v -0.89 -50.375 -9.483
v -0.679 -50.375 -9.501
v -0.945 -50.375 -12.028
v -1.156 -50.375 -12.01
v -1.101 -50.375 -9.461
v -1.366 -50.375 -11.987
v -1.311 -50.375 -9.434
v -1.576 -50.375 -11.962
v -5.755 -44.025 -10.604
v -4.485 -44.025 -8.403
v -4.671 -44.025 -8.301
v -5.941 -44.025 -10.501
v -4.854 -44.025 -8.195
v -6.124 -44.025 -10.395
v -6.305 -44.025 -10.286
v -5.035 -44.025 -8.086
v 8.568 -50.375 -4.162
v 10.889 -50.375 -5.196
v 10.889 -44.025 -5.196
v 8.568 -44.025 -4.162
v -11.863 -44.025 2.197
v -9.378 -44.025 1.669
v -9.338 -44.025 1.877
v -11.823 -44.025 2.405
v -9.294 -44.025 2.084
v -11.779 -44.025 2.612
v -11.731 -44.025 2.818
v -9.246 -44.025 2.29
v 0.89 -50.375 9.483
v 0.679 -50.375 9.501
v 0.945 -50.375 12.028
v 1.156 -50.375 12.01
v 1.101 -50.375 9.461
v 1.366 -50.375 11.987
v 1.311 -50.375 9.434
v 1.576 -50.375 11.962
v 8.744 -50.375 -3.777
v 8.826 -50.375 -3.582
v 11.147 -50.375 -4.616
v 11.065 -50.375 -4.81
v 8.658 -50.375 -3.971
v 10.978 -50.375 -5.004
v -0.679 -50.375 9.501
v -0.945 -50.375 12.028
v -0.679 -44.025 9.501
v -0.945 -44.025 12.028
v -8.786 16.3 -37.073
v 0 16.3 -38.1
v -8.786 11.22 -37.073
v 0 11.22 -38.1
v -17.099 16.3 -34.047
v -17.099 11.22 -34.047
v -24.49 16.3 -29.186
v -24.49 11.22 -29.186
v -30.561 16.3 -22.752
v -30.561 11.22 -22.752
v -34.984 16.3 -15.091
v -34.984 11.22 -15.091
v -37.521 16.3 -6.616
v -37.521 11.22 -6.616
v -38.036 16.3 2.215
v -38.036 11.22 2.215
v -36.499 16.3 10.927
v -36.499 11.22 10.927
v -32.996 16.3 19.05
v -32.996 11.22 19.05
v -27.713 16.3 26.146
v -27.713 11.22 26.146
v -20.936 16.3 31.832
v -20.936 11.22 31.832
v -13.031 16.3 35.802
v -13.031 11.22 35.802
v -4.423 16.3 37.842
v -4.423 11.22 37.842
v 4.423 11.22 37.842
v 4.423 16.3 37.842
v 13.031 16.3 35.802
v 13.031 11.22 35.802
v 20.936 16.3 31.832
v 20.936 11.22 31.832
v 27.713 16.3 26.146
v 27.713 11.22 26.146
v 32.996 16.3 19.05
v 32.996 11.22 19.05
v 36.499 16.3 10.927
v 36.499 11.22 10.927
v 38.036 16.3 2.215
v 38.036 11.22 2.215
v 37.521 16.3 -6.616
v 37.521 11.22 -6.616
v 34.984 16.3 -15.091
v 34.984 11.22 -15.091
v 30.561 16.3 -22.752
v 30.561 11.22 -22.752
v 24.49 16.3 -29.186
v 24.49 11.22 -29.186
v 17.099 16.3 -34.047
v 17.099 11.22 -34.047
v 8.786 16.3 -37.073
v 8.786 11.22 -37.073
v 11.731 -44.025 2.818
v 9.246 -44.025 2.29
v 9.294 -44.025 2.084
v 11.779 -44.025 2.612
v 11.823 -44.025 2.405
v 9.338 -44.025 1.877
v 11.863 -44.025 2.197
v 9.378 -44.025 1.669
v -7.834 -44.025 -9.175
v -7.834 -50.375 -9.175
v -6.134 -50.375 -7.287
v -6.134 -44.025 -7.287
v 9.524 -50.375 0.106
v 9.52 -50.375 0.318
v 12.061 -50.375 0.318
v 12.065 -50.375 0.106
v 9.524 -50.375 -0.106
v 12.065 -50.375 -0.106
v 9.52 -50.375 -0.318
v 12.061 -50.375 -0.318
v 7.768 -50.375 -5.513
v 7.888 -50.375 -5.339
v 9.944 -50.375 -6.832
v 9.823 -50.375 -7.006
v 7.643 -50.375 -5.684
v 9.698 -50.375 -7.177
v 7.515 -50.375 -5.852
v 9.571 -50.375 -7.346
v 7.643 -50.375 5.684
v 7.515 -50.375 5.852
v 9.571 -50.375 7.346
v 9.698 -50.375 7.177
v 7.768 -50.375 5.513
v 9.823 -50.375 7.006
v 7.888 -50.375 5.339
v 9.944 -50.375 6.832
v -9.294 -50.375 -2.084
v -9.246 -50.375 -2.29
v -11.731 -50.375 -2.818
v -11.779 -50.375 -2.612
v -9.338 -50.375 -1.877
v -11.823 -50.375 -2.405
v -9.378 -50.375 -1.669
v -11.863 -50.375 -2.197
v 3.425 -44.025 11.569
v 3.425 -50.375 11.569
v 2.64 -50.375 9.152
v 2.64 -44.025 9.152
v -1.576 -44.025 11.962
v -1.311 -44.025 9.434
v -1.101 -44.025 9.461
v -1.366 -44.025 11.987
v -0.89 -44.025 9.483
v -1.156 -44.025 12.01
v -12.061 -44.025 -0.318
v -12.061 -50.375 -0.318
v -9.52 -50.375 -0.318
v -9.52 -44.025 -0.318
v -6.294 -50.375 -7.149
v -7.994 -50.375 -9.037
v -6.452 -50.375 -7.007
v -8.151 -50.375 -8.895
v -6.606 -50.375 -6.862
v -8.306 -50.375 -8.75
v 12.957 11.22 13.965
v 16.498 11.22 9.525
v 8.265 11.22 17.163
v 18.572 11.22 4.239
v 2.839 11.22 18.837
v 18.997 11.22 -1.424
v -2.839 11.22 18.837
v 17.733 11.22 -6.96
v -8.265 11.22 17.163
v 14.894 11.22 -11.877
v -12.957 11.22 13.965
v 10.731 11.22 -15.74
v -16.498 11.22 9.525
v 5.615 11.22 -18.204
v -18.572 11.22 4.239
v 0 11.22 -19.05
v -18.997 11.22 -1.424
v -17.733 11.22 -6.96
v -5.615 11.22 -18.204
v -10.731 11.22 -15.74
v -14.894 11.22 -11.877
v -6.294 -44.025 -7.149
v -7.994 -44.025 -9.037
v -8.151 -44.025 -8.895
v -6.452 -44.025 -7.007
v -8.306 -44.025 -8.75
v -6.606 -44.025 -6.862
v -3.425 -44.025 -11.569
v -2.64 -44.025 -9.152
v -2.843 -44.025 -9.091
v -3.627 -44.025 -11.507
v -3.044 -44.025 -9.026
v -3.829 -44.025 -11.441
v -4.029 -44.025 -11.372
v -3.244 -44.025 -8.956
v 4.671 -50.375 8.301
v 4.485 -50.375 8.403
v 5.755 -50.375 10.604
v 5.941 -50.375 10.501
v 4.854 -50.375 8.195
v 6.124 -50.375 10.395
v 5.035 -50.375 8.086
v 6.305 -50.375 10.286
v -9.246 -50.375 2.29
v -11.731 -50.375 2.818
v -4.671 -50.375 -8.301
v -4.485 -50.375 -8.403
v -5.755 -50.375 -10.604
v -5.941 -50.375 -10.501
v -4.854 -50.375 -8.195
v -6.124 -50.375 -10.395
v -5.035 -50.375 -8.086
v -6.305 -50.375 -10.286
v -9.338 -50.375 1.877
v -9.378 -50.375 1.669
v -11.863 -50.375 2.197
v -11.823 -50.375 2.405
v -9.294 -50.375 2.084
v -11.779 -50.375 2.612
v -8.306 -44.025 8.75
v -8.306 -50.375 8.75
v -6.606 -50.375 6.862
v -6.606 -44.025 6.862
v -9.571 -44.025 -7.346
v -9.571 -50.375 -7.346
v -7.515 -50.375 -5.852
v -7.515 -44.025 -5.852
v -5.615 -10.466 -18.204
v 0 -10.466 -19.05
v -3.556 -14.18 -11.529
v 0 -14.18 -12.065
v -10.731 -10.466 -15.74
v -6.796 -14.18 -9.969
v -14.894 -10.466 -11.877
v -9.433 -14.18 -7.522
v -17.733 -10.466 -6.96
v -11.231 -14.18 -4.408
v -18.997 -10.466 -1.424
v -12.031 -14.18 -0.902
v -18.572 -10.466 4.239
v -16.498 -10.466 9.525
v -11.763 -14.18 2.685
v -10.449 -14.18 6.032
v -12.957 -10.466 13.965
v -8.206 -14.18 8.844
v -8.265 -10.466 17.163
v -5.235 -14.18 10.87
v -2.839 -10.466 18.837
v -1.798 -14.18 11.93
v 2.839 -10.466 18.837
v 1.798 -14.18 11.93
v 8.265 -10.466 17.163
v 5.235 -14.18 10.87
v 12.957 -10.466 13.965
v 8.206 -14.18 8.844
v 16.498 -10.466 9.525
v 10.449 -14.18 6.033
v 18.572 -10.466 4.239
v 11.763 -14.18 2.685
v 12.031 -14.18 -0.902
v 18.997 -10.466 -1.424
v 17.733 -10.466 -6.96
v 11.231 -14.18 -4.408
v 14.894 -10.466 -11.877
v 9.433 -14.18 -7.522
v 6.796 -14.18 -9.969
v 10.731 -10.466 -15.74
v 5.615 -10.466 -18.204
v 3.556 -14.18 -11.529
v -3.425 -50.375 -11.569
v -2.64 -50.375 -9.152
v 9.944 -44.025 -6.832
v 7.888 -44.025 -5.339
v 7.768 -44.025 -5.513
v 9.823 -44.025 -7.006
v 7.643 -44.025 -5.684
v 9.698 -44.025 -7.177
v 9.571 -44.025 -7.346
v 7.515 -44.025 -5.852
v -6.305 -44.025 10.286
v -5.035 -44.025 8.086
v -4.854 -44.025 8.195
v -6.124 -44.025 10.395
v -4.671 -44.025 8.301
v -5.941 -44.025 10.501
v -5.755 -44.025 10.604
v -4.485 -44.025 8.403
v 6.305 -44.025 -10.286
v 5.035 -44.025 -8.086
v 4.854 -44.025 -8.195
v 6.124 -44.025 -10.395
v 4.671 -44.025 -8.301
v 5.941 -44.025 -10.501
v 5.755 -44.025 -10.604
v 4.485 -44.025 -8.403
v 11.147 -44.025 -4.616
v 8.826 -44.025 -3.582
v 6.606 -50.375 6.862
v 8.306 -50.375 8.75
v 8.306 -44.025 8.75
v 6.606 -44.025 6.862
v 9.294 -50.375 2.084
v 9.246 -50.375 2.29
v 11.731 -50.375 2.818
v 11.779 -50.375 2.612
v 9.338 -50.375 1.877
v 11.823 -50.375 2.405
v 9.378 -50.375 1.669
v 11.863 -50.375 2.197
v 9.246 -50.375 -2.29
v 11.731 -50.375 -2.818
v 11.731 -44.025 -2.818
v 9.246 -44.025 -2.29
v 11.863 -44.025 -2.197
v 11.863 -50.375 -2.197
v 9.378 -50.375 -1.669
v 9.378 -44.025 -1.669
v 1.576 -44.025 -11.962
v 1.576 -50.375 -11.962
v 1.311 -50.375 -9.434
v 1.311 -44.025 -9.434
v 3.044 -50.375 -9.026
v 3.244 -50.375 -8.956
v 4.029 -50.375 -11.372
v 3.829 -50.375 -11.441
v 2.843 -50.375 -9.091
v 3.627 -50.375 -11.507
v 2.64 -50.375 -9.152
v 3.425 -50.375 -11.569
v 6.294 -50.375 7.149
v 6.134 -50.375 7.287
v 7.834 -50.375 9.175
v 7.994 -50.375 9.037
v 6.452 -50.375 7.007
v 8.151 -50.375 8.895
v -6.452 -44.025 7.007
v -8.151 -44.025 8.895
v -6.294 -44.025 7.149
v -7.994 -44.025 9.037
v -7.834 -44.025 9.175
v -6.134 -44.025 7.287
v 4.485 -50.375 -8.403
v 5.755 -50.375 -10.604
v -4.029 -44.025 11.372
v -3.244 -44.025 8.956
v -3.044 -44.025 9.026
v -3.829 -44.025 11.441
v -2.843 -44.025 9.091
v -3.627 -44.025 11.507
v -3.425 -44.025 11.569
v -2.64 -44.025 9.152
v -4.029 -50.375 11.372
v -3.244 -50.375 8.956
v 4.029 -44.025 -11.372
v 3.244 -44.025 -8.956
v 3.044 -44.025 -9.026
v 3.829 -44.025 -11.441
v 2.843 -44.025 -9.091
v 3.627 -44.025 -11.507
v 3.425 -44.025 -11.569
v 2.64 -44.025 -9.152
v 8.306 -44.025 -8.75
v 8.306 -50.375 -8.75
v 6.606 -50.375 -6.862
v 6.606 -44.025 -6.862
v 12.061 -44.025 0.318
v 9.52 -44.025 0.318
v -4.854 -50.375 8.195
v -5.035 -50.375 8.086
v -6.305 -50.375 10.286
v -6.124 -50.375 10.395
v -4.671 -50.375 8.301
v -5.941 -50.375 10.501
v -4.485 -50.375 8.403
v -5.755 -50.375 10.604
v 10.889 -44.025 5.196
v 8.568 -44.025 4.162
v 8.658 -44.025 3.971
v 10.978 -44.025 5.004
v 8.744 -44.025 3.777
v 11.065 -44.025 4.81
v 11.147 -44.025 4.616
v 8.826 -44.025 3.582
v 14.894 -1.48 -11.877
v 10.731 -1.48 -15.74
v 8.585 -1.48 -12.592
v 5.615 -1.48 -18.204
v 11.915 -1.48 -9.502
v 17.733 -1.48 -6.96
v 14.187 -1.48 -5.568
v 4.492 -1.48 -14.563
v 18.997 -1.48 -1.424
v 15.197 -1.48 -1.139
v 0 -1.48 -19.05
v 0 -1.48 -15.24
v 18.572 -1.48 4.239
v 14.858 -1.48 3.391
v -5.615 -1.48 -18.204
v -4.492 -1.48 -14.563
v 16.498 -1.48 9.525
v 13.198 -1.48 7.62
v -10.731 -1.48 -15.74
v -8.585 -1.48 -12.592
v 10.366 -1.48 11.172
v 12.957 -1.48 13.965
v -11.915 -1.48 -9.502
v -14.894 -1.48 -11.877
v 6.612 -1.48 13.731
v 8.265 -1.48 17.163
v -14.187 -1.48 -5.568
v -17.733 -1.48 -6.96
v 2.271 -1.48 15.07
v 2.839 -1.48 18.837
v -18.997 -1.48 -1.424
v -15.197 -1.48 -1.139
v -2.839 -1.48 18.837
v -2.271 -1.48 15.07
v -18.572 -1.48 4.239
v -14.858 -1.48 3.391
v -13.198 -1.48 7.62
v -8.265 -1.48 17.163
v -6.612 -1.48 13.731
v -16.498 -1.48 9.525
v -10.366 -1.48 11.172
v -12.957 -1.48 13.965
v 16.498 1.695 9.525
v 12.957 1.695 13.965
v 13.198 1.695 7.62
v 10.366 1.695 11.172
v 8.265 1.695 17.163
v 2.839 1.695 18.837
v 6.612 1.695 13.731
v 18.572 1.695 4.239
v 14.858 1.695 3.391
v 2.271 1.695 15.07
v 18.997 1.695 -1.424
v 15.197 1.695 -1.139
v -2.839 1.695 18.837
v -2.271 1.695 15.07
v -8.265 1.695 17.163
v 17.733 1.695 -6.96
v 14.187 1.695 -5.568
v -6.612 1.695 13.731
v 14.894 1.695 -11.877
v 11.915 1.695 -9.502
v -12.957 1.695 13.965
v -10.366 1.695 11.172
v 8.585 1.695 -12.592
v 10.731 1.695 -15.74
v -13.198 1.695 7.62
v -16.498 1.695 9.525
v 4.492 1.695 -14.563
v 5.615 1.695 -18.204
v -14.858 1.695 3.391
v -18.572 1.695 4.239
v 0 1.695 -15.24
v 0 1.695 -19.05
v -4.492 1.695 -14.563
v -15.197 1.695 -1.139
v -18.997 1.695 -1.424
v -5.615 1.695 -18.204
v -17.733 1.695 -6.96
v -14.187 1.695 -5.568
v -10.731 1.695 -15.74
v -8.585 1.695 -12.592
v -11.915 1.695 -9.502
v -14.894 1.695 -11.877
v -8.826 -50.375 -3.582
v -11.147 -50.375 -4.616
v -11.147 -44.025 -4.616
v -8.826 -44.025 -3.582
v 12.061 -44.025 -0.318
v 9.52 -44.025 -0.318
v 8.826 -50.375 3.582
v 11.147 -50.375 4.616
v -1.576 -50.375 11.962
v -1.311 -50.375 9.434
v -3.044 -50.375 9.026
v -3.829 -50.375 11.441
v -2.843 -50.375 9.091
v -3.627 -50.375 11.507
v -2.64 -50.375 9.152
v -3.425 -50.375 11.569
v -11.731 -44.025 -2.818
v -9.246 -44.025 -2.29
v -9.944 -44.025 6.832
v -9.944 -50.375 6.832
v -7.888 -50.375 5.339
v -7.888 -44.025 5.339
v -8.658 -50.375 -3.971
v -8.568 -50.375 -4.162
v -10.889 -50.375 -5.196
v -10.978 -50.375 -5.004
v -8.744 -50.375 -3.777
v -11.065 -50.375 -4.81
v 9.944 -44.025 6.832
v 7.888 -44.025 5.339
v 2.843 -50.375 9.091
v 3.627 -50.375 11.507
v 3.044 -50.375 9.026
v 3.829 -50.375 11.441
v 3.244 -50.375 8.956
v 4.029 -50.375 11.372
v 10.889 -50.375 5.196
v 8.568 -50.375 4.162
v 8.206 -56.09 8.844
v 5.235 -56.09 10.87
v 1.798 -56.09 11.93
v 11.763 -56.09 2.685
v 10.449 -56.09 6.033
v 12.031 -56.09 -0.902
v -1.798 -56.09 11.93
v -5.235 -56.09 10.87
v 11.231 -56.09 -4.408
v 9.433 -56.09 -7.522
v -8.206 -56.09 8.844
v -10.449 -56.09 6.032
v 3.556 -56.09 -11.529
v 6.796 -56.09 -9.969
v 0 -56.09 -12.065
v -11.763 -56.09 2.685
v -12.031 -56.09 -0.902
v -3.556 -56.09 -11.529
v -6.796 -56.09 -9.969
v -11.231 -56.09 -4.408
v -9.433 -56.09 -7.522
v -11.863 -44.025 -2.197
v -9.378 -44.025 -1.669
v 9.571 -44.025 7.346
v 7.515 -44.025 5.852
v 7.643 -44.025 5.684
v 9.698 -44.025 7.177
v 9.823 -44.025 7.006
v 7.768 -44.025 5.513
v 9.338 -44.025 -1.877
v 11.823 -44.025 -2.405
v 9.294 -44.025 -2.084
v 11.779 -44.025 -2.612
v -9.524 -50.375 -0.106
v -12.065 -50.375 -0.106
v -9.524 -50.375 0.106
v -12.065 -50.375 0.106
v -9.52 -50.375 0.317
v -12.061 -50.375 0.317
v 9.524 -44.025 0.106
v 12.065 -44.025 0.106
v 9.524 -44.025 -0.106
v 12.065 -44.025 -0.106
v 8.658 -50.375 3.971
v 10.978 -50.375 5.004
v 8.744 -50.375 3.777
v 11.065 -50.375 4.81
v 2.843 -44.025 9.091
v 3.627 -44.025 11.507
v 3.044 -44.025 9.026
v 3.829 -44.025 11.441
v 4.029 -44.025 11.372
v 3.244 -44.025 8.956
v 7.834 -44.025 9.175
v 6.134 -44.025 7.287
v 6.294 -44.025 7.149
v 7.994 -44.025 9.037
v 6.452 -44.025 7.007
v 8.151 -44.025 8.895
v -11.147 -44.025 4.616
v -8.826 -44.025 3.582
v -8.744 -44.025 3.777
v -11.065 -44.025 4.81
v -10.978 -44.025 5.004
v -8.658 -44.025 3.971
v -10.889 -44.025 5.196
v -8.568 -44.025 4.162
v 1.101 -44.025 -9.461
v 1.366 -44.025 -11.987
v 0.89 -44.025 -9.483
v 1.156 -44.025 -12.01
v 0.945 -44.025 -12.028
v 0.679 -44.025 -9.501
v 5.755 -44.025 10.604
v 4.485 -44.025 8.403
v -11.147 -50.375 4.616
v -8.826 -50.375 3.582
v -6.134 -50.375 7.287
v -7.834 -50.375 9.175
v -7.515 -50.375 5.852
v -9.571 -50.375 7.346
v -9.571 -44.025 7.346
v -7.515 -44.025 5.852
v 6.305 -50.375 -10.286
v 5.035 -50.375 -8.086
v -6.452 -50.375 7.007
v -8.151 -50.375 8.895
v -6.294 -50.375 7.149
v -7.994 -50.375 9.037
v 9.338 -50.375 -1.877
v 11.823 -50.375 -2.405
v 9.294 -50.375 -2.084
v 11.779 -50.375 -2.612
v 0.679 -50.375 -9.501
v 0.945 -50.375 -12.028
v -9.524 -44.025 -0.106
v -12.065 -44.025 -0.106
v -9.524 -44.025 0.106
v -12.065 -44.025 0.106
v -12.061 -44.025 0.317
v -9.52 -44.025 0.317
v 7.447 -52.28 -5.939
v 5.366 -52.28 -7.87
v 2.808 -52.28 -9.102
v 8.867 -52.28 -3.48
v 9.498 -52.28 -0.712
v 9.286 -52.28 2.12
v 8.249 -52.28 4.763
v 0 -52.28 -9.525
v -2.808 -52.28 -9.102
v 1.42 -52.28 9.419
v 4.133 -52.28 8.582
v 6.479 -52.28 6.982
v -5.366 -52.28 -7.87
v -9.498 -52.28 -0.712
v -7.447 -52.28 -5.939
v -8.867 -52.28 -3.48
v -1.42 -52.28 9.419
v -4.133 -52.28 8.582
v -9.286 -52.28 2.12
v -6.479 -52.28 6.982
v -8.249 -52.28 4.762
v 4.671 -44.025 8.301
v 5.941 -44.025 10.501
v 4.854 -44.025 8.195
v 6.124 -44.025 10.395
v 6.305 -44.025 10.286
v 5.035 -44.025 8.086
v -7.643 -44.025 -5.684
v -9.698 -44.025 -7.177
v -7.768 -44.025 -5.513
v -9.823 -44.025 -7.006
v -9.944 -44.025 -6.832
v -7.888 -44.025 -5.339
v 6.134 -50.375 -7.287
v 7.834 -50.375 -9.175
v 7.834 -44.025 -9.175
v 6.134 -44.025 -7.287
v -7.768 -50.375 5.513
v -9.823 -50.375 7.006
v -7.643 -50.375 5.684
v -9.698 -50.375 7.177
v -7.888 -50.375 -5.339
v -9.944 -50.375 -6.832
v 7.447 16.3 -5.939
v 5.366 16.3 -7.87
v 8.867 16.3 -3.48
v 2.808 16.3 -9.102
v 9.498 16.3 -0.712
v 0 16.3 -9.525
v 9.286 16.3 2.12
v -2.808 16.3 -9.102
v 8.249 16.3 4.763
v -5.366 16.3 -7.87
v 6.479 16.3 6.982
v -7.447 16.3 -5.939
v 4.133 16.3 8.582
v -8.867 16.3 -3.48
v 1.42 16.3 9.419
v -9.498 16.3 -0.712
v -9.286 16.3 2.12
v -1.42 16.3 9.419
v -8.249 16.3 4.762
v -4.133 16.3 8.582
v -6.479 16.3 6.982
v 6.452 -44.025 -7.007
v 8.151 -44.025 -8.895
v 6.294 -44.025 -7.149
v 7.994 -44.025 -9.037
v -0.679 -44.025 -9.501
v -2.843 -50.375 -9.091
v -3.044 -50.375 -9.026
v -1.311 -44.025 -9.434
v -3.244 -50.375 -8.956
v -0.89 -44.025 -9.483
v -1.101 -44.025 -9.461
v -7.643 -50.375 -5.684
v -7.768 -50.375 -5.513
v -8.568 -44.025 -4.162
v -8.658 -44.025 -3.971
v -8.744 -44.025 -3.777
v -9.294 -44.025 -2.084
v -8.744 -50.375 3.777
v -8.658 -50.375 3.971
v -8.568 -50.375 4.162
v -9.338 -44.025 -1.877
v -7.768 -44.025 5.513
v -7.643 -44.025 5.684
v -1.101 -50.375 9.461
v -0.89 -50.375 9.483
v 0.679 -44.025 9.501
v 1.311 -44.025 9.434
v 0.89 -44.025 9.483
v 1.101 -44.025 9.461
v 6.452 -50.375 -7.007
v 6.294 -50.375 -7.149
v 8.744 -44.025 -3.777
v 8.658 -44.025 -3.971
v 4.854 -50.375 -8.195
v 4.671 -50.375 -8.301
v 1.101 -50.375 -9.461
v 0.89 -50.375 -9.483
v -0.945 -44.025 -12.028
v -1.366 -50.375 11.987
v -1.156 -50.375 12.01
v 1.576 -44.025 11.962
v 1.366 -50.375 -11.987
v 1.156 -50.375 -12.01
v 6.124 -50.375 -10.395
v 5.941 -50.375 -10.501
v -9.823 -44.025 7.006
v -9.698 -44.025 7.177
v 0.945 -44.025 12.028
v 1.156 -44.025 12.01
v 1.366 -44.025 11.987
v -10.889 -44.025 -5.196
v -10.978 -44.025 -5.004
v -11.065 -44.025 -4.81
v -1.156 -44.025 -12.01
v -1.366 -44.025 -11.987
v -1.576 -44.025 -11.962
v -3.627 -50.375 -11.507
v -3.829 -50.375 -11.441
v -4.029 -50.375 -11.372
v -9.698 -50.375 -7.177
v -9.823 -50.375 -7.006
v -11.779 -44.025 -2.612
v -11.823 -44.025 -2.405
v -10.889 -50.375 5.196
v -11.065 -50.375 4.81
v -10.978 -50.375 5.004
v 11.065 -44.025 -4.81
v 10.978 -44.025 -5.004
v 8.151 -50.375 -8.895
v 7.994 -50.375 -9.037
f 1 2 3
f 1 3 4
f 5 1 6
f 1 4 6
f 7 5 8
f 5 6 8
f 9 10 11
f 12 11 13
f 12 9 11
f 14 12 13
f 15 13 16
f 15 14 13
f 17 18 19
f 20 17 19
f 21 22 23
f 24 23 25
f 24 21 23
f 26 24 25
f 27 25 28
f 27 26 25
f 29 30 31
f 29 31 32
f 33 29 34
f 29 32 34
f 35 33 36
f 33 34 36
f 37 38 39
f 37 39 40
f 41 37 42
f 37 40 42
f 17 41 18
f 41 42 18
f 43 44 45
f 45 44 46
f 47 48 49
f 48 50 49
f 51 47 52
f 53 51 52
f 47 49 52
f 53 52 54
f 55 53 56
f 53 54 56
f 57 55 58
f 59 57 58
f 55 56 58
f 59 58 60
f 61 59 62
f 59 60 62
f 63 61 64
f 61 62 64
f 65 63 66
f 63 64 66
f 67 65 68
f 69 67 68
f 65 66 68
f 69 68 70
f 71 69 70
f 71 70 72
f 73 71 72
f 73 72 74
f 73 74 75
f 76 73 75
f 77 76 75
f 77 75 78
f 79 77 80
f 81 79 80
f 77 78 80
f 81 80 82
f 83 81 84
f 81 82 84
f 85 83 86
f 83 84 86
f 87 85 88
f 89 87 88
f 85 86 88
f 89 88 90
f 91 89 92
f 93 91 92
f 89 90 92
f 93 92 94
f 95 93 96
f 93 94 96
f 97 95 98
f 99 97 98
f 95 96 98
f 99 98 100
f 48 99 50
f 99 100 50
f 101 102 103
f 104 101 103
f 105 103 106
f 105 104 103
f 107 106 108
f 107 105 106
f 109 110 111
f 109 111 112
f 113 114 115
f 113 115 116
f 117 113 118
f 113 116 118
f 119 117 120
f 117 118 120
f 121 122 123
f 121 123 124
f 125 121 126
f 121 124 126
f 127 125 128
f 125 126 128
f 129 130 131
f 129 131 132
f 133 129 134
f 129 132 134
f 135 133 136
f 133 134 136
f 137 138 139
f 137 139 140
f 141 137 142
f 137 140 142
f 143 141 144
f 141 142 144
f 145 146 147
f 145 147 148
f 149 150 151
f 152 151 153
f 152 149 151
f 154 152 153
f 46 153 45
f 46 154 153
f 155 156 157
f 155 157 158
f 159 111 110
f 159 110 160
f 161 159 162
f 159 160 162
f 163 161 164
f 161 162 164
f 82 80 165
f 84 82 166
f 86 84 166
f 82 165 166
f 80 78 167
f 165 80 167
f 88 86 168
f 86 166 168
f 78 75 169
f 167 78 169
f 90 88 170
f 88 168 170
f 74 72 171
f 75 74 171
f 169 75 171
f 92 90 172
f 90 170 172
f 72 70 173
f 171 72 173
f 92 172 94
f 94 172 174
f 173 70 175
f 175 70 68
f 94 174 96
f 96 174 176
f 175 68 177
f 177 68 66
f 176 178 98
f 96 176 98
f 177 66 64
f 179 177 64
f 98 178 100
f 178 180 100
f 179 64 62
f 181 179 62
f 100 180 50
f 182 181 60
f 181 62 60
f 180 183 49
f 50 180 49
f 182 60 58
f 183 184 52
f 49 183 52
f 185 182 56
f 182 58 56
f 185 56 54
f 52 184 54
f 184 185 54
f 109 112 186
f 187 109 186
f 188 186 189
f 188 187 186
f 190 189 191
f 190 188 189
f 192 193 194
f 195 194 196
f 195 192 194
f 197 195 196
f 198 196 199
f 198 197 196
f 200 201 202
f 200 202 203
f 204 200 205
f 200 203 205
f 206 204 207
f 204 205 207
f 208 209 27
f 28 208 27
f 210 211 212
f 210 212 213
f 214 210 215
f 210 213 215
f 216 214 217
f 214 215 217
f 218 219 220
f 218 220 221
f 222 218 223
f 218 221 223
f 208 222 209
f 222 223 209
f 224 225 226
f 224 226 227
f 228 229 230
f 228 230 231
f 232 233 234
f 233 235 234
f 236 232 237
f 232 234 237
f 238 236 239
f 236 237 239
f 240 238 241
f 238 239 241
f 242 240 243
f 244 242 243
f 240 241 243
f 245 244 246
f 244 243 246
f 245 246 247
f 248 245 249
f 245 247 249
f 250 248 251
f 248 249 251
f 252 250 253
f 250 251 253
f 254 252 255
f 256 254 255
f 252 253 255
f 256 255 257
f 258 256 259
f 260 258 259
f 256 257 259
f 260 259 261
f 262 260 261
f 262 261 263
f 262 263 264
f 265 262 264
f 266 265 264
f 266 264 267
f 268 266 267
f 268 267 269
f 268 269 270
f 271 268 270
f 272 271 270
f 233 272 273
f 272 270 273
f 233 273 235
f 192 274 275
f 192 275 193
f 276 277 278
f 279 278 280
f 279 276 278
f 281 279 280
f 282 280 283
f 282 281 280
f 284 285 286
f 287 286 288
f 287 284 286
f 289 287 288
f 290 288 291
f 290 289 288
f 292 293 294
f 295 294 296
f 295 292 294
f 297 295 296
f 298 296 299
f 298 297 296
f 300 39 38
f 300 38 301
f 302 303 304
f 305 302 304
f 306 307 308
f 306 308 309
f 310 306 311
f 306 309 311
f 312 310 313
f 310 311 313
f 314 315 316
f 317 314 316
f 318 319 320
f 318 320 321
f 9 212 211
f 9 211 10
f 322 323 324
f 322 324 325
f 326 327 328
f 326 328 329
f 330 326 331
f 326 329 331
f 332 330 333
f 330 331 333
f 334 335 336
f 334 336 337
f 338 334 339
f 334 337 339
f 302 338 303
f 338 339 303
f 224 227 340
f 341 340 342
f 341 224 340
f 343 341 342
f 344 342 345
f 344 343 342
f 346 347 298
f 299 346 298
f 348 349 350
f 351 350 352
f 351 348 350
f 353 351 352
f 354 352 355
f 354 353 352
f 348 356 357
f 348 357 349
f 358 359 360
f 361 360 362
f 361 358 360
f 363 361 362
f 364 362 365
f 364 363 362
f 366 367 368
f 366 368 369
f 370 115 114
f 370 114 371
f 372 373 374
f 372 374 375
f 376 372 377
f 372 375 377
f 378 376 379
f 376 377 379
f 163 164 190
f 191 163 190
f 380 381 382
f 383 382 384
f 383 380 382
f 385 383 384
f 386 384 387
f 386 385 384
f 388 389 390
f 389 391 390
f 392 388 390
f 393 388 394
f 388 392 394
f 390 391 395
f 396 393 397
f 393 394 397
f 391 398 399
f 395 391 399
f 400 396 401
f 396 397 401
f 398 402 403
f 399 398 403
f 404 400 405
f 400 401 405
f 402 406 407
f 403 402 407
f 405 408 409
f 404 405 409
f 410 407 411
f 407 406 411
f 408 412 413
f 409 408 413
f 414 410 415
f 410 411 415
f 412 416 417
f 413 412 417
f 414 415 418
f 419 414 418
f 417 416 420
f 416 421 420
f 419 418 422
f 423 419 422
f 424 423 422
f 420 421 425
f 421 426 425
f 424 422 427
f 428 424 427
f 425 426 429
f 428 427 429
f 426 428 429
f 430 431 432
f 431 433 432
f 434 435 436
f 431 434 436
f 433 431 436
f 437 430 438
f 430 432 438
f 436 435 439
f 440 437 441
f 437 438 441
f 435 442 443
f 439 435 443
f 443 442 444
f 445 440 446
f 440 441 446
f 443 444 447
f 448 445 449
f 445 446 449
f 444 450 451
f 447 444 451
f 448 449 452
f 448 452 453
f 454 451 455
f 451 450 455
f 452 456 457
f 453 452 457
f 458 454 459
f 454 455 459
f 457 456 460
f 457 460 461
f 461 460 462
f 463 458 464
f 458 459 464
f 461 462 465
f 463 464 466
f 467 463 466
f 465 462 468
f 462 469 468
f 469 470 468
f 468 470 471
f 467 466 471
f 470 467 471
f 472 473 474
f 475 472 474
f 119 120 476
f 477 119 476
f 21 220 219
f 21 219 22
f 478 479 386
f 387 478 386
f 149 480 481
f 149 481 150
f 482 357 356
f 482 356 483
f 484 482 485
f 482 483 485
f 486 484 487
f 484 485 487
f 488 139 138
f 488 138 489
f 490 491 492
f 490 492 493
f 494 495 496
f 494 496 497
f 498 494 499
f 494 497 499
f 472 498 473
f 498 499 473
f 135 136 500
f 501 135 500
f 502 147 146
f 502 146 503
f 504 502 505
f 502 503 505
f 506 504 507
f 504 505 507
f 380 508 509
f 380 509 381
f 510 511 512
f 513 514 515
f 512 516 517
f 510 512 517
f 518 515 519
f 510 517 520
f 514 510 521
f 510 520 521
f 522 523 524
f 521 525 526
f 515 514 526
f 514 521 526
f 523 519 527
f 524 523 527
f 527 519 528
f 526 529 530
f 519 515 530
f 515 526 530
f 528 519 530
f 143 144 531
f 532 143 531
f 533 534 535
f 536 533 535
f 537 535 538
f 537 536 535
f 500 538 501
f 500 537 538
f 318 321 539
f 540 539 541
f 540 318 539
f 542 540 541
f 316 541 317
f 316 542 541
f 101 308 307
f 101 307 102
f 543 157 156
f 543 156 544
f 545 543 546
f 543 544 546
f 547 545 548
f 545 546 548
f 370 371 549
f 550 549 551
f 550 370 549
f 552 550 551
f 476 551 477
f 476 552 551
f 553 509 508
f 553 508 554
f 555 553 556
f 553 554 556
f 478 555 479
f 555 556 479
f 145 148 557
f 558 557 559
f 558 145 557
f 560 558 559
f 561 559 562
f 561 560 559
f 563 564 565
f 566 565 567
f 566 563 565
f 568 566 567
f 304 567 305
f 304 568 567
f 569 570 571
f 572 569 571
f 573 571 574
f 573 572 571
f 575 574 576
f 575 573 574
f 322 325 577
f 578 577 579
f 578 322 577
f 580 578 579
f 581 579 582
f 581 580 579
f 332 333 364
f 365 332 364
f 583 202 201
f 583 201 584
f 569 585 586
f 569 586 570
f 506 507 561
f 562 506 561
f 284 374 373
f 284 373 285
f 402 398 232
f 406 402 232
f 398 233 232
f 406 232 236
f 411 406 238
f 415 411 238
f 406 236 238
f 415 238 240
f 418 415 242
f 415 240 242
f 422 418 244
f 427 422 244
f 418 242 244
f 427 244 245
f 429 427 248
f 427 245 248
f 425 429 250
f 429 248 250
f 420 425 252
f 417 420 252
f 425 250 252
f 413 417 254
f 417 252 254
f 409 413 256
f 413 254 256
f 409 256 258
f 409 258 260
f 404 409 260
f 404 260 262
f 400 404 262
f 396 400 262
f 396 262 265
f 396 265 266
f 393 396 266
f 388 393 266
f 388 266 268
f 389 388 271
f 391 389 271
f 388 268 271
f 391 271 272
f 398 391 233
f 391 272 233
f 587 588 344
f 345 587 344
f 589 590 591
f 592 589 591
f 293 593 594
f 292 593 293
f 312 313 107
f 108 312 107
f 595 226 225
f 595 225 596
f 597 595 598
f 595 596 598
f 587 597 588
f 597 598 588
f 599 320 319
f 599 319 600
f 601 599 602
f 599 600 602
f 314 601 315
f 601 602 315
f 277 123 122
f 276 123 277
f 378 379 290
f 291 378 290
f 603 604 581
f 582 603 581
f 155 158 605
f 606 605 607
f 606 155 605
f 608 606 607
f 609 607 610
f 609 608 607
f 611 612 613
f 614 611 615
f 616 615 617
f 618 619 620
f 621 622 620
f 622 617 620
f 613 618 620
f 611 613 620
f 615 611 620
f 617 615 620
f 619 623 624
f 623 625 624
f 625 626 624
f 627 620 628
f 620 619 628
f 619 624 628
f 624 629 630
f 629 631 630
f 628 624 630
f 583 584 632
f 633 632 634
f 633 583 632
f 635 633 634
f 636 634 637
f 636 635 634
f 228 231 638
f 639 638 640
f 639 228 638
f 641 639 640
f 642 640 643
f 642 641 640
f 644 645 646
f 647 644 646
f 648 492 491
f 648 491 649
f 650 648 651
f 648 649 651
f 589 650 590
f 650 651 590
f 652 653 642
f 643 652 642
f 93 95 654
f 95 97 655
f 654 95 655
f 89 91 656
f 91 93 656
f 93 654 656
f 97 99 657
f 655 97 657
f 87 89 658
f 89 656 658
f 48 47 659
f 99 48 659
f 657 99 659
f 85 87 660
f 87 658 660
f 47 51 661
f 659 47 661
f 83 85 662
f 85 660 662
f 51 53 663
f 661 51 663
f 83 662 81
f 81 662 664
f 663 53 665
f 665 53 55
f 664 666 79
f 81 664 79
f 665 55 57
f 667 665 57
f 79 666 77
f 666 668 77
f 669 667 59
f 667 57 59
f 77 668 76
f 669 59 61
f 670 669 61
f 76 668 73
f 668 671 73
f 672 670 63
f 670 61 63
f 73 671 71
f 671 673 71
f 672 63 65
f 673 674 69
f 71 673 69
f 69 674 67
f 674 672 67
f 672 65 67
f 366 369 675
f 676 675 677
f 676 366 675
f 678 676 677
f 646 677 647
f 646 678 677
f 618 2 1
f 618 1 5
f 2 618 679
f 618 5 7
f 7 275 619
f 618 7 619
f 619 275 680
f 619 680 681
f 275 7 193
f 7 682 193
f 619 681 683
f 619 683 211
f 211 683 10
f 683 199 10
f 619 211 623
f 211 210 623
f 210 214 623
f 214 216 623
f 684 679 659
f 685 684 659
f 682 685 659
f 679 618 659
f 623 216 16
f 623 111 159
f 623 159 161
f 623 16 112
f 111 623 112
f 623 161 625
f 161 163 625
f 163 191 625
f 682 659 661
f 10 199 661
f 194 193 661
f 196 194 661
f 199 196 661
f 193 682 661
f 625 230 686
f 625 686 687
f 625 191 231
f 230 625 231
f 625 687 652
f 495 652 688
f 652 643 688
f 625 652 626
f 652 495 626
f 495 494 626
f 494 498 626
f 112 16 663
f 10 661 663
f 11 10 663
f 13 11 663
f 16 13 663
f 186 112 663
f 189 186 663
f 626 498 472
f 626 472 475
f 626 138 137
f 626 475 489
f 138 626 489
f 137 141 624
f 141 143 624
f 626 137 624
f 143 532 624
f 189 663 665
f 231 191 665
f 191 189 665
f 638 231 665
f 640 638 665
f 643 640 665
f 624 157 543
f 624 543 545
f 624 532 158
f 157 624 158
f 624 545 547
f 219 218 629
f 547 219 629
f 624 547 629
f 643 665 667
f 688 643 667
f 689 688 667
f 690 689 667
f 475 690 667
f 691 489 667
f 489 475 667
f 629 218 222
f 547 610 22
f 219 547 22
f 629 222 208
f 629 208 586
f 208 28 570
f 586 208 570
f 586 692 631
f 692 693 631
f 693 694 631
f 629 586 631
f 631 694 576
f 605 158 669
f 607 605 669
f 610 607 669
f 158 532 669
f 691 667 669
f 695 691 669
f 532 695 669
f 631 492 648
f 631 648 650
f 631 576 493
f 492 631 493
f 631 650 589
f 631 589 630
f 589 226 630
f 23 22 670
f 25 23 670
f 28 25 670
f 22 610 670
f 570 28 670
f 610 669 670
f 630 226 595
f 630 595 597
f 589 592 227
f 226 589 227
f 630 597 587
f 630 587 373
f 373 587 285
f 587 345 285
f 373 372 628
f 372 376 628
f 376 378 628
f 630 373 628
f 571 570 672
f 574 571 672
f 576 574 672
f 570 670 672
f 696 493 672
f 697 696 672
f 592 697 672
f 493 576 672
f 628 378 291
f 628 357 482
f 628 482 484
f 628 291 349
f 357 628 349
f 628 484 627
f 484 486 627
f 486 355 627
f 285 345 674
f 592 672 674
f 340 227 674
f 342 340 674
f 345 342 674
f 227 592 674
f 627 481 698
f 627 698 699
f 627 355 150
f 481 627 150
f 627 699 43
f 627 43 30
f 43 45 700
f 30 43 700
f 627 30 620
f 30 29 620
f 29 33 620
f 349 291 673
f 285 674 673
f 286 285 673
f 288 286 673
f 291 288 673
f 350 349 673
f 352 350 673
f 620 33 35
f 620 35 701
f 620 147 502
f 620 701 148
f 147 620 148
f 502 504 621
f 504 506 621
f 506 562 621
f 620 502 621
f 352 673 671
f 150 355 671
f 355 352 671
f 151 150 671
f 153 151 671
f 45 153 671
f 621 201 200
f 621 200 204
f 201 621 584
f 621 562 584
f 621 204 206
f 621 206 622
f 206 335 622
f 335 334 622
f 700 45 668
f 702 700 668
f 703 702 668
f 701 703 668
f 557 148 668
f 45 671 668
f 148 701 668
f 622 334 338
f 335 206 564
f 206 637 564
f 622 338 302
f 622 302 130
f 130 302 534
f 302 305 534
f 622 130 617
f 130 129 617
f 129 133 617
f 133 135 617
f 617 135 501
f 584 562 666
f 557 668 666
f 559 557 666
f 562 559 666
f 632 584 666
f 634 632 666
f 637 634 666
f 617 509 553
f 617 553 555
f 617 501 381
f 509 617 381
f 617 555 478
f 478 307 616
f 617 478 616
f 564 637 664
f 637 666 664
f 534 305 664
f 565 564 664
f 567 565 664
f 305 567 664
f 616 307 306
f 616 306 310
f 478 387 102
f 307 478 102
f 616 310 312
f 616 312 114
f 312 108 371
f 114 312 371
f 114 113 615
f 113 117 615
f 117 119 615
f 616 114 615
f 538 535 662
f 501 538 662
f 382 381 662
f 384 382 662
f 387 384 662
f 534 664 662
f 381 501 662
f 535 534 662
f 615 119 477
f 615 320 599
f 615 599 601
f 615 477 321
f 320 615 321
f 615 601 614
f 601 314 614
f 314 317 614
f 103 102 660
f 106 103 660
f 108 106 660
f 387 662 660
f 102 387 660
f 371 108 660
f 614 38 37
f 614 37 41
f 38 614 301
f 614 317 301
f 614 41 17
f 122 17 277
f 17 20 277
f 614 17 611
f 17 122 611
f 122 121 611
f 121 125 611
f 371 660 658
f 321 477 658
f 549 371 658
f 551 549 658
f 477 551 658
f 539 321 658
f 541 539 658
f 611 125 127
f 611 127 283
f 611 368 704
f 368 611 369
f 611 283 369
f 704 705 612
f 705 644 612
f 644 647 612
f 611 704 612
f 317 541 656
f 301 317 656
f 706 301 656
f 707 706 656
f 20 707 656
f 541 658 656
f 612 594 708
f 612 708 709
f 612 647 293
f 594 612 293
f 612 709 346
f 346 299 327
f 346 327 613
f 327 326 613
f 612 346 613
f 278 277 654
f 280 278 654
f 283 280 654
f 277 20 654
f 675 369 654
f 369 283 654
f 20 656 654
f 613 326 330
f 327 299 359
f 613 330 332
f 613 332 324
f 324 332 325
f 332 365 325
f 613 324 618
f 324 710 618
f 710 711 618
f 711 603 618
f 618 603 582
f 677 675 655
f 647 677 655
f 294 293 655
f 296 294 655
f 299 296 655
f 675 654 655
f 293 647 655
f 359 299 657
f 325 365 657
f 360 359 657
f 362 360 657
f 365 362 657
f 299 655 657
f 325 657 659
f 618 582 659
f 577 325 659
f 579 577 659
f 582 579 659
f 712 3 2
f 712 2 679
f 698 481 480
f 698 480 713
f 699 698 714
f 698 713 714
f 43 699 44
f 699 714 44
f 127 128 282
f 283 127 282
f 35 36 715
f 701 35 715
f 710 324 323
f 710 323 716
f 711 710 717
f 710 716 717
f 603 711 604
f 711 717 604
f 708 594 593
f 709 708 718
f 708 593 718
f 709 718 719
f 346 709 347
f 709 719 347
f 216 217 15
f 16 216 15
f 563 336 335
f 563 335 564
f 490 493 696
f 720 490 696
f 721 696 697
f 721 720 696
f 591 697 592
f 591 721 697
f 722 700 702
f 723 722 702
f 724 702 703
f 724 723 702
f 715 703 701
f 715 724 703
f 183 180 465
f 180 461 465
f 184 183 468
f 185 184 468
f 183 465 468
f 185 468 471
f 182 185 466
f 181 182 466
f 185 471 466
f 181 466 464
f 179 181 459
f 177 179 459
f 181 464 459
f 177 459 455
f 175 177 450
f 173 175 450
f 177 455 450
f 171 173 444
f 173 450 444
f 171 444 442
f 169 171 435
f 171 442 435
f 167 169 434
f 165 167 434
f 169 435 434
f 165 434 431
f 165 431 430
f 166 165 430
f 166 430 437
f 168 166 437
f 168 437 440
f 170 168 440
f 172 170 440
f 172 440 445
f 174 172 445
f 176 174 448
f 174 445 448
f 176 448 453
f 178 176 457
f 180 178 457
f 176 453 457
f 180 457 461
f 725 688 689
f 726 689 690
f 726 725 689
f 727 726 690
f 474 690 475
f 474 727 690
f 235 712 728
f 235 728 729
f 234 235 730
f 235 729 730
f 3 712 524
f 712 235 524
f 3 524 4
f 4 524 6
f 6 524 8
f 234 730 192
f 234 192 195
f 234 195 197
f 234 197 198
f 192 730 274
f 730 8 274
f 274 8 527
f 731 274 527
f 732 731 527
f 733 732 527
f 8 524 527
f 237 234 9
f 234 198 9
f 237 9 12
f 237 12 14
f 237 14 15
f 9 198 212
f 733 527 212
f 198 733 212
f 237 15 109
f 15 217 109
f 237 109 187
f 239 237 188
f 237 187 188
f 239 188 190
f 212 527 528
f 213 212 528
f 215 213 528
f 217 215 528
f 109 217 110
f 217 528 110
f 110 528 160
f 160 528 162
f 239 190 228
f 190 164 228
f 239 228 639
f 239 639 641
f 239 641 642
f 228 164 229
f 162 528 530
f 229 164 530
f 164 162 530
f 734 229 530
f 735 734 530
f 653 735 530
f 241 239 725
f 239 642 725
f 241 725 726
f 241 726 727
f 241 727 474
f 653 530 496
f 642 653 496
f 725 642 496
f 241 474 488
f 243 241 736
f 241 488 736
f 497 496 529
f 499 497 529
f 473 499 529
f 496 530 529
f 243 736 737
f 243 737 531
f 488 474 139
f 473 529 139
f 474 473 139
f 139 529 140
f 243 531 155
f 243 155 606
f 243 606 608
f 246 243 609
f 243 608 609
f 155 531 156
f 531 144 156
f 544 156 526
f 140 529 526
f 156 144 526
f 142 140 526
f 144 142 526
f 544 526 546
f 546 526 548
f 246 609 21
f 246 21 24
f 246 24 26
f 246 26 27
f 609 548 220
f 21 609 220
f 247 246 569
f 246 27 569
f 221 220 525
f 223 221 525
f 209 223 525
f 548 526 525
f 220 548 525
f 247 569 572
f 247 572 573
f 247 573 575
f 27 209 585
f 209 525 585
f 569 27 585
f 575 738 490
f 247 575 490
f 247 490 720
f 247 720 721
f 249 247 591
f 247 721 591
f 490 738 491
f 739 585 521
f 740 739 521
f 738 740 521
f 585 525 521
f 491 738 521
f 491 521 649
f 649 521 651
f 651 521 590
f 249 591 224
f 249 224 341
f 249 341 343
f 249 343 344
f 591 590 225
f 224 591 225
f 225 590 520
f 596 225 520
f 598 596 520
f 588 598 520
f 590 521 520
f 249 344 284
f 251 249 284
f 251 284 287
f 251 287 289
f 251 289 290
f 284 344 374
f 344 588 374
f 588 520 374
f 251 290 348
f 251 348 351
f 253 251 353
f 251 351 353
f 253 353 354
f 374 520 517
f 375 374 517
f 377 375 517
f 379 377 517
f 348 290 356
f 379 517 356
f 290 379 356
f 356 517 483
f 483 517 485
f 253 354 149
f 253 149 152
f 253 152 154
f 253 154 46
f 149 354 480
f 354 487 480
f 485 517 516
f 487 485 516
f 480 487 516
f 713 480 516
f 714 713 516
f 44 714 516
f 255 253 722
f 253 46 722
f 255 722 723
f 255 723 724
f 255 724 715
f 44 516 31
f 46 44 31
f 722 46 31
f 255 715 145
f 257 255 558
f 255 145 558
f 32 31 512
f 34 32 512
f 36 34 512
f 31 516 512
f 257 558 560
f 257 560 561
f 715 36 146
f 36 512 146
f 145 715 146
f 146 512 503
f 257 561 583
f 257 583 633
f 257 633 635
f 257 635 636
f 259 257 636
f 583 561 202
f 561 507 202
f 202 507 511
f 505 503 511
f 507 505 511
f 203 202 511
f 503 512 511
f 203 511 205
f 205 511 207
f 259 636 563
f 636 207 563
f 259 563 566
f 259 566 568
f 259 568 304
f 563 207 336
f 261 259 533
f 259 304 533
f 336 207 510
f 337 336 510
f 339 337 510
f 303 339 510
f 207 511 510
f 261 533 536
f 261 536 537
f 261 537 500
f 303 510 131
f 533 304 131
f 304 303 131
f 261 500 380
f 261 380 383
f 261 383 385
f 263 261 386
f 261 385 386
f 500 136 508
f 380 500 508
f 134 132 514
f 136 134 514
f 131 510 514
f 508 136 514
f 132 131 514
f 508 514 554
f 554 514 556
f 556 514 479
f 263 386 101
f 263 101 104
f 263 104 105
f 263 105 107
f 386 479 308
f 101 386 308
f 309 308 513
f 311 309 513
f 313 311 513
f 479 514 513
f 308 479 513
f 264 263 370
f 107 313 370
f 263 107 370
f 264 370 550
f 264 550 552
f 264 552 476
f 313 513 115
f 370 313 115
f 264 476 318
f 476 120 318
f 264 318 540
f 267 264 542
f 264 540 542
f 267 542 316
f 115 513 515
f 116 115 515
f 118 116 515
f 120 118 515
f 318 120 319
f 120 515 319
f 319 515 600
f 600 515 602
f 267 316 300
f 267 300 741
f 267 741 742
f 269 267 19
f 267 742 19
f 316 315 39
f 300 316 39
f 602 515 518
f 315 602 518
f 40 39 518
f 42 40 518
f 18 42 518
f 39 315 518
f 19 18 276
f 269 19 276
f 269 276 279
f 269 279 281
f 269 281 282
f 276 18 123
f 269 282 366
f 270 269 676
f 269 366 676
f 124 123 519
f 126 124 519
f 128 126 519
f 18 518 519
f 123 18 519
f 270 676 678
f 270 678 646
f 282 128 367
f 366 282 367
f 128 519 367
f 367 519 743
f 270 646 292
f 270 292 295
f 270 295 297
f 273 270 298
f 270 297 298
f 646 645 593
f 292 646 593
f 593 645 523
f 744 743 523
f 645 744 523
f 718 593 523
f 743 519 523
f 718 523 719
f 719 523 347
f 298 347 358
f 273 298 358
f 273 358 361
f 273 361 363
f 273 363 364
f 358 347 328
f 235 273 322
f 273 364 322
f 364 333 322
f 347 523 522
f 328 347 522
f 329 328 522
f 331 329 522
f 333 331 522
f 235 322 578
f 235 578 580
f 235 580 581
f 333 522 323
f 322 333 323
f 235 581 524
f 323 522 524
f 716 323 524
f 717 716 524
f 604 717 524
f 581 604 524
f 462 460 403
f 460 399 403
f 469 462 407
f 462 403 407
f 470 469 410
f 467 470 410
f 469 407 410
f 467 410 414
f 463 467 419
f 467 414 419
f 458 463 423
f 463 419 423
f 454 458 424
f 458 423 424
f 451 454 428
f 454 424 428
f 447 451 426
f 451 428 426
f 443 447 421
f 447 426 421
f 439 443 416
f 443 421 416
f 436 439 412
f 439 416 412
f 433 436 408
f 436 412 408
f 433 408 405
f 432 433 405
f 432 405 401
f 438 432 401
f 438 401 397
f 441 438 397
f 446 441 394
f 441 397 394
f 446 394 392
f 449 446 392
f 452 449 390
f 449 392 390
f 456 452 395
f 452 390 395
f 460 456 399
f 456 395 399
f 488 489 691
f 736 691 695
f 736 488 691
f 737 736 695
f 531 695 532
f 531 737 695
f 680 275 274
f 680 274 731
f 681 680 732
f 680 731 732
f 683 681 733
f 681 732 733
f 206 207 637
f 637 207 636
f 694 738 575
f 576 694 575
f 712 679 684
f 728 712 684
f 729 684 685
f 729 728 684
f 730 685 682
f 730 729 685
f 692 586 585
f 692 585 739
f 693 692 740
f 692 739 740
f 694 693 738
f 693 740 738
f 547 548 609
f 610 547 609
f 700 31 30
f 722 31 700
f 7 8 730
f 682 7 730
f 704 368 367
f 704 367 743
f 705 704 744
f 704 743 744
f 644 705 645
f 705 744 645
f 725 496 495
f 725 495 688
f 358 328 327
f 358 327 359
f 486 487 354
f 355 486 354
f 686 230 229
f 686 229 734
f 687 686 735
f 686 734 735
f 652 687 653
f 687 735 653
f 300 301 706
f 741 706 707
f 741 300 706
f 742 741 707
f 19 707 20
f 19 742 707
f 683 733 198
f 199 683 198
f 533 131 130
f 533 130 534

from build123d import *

# Parameters (mm, degrees)
SKETCH4_W          = 0.635
SKETCH4_H          = 6.35
CUT_EXTRUDE2_DEPTH = 6.35
CIRPATTERN1_COUNT  = 30


with BuildPart() as part:
    # Sketch3 → Revolve1 (revolve)
    with BuildSketch(Plane.XY, mode=Mode.PRIVATE) as revolve1_sk:
        Polygon((-38.1, 16.300354852), (-38.1, 11.220354852), (-19.05, 11.220354852), (-19.05, 1.695354852), (-15.24, 1.695354852), (-15.24, -1.479645148), (-19.05, -1.479645148), (-19.05, -10.465654768), (-12.065, -14.179645148), (-12.065, -56.089645148), (0, -56.089645148), (0, -52.279645148), (-9.525, -52.279645148), (-9.525, 16.300354852), align=None)
    revolve(revolve1_sk.sketch.rotate(Axis((0, 0, 0), (0, 1, 0)), 270), axis=Axis((0, 0, 0), (0, 1, 0)))

    # Sketch4 → Cut-Extrude2 (cut)
    with BuildSketch(Plane(origin=(12.065, 0, 0), x_dir=(0, 0, -1), z_dir=(1, 0, 0))):
        with Locations((0, -47.199645148)):
            Rectangle(SKETCH4_W, SKETCH4_H)
    cut_extrude2 = extrude(amount=-CUT_EXTRUDE2_DEPTH, mode=Mode.SUBTRACT)

    # CirPattern1: Cut-Extrude2 ×30 about axis
    cirpattern1_axis = Axis((0, 0, 0), (0, 1, 0))
    for i in range(1, CIRPATTERN1_COUNT):
        add(cut_extrude2.rotate(cirpattern1_axis, i * 360 / CIRPATTERN1_COUNT), mode=Mode.SUBTRACT)


solid = part.part
